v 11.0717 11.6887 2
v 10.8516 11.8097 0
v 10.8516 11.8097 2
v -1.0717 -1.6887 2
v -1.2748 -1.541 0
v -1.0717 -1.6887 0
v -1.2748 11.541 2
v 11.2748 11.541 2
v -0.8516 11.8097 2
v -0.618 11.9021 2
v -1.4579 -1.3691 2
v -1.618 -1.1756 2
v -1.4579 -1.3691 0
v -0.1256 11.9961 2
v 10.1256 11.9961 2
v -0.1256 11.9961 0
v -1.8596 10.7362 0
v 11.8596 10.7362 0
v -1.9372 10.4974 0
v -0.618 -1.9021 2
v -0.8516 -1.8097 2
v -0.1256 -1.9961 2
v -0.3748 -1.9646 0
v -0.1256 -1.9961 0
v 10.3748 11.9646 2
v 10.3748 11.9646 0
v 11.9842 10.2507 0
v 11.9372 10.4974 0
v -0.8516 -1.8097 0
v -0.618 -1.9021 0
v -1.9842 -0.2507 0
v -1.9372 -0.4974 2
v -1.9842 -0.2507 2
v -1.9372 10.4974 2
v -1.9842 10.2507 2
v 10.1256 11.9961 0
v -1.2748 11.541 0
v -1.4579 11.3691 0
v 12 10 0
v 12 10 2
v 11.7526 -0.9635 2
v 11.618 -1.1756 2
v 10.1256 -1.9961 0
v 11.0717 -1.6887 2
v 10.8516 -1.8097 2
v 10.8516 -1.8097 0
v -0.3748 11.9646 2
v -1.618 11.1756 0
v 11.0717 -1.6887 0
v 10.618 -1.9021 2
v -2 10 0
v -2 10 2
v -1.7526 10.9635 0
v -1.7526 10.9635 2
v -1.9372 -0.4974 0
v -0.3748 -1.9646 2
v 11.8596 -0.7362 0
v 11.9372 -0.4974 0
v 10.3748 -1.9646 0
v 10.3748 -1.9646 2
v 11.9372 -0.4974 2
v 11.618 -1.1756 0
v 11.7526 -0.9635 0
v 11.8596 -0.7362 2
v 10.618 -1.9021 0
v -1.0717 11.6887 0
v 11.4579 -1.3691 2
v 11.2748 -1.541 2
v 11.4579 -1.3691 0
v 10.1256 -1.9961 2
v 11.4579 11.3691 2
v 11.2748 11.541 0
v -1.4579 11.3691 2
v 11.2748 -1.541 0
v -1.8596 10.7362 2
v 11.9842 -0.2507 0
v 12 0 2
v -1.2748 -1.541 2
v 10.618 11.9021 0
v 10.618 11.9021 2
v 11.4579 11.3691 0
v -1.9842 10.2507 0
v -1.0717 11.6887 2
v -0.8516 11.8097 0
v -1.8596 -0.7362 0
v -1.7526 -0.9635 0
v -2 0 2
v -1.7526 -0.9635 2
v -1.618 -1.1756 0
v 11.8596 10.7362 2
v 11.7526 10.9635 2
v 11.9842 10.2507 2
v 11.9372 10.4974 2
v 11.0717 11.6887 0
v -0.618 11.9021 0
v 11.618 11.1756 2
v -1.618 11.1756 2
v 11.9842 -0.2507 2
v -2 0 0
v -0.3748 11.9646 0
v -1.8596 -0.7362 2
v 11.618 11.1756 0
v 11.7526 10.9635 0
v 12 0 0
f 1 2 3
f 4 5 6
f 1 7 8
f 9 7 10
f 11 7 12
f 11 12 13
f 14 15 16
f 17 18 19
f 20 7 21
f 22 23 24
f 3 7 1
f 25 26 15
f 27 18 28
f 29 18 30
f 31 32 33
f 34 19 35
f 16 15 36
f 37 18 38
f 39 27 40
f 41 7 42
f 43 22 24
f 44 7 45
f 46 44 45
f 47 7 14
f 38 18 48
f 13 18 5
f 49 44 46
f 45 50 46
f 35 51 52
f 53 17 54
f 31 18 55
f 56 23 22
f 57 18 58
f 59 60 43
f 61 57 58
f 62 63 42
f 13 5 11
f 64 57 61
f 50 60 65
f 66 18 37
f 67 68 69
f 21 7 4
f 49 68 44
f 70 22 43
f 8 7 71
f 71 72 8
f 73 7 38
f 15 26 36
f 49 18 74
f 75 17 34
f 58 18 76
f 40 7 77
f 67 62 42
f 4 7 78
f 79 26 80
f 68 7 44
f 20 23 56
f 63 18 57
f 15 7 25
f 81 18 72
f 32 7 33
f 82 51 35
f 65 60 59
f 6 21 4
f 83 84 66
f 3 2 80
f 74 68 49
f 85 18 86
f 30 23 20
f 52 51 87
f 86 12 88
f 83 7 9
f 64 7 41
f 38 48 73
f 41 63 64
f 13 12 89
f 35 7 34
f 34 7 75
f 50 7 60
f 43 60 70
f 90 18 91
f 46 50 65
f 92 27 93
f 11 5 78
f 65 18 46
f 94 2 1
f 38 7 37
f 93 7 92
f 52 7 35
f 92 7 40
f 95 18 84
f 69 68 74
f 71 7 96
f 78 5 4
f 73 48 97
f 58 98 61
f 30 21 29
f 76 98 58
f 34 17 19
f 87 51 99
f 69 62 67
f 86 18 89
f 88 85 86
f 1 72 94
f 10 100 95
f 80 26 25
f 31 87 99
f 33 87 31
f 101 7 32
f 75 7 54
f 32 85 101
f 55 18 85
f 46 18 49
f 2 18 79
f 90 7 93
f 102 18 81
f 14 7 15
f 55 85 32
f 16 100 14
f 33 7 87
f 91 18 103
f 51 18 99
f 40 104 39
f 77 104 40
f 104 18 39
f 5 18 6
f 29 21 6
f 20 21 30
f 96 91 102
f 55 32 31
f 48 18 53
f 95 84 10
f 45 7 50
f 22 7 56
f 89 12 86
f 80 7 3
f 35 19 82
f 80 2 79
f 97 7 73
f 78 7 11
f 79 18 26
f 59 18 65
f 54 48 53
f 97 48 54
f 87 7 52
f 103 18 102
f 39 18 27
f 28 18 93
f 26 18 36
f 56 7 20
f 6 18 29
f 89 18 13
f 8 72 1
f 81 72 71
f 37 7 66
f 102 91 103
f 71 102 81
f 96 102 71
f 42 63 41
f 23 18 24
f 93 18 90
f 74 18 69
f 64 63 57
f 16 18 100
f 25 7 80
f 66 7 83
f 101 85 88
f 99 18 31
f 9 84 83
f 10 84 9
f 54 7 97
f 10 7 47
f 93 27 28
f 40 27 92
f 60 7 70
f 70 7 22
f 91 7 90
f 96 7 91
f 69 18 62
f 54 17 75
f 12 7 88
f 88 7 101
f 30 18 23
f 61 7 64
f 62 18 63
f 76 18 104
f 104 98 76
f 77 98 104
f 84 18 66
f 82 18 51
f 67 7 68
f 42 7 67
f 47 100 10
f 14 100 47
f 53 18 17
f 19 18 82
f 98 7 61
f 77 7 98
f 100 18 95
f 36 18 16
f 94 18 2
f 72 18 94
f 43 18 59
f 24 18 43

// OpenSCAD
$fn=50;
minkowski()
{
 cube([10,10,1]);
 cylinder(r=2,h=1);
}
